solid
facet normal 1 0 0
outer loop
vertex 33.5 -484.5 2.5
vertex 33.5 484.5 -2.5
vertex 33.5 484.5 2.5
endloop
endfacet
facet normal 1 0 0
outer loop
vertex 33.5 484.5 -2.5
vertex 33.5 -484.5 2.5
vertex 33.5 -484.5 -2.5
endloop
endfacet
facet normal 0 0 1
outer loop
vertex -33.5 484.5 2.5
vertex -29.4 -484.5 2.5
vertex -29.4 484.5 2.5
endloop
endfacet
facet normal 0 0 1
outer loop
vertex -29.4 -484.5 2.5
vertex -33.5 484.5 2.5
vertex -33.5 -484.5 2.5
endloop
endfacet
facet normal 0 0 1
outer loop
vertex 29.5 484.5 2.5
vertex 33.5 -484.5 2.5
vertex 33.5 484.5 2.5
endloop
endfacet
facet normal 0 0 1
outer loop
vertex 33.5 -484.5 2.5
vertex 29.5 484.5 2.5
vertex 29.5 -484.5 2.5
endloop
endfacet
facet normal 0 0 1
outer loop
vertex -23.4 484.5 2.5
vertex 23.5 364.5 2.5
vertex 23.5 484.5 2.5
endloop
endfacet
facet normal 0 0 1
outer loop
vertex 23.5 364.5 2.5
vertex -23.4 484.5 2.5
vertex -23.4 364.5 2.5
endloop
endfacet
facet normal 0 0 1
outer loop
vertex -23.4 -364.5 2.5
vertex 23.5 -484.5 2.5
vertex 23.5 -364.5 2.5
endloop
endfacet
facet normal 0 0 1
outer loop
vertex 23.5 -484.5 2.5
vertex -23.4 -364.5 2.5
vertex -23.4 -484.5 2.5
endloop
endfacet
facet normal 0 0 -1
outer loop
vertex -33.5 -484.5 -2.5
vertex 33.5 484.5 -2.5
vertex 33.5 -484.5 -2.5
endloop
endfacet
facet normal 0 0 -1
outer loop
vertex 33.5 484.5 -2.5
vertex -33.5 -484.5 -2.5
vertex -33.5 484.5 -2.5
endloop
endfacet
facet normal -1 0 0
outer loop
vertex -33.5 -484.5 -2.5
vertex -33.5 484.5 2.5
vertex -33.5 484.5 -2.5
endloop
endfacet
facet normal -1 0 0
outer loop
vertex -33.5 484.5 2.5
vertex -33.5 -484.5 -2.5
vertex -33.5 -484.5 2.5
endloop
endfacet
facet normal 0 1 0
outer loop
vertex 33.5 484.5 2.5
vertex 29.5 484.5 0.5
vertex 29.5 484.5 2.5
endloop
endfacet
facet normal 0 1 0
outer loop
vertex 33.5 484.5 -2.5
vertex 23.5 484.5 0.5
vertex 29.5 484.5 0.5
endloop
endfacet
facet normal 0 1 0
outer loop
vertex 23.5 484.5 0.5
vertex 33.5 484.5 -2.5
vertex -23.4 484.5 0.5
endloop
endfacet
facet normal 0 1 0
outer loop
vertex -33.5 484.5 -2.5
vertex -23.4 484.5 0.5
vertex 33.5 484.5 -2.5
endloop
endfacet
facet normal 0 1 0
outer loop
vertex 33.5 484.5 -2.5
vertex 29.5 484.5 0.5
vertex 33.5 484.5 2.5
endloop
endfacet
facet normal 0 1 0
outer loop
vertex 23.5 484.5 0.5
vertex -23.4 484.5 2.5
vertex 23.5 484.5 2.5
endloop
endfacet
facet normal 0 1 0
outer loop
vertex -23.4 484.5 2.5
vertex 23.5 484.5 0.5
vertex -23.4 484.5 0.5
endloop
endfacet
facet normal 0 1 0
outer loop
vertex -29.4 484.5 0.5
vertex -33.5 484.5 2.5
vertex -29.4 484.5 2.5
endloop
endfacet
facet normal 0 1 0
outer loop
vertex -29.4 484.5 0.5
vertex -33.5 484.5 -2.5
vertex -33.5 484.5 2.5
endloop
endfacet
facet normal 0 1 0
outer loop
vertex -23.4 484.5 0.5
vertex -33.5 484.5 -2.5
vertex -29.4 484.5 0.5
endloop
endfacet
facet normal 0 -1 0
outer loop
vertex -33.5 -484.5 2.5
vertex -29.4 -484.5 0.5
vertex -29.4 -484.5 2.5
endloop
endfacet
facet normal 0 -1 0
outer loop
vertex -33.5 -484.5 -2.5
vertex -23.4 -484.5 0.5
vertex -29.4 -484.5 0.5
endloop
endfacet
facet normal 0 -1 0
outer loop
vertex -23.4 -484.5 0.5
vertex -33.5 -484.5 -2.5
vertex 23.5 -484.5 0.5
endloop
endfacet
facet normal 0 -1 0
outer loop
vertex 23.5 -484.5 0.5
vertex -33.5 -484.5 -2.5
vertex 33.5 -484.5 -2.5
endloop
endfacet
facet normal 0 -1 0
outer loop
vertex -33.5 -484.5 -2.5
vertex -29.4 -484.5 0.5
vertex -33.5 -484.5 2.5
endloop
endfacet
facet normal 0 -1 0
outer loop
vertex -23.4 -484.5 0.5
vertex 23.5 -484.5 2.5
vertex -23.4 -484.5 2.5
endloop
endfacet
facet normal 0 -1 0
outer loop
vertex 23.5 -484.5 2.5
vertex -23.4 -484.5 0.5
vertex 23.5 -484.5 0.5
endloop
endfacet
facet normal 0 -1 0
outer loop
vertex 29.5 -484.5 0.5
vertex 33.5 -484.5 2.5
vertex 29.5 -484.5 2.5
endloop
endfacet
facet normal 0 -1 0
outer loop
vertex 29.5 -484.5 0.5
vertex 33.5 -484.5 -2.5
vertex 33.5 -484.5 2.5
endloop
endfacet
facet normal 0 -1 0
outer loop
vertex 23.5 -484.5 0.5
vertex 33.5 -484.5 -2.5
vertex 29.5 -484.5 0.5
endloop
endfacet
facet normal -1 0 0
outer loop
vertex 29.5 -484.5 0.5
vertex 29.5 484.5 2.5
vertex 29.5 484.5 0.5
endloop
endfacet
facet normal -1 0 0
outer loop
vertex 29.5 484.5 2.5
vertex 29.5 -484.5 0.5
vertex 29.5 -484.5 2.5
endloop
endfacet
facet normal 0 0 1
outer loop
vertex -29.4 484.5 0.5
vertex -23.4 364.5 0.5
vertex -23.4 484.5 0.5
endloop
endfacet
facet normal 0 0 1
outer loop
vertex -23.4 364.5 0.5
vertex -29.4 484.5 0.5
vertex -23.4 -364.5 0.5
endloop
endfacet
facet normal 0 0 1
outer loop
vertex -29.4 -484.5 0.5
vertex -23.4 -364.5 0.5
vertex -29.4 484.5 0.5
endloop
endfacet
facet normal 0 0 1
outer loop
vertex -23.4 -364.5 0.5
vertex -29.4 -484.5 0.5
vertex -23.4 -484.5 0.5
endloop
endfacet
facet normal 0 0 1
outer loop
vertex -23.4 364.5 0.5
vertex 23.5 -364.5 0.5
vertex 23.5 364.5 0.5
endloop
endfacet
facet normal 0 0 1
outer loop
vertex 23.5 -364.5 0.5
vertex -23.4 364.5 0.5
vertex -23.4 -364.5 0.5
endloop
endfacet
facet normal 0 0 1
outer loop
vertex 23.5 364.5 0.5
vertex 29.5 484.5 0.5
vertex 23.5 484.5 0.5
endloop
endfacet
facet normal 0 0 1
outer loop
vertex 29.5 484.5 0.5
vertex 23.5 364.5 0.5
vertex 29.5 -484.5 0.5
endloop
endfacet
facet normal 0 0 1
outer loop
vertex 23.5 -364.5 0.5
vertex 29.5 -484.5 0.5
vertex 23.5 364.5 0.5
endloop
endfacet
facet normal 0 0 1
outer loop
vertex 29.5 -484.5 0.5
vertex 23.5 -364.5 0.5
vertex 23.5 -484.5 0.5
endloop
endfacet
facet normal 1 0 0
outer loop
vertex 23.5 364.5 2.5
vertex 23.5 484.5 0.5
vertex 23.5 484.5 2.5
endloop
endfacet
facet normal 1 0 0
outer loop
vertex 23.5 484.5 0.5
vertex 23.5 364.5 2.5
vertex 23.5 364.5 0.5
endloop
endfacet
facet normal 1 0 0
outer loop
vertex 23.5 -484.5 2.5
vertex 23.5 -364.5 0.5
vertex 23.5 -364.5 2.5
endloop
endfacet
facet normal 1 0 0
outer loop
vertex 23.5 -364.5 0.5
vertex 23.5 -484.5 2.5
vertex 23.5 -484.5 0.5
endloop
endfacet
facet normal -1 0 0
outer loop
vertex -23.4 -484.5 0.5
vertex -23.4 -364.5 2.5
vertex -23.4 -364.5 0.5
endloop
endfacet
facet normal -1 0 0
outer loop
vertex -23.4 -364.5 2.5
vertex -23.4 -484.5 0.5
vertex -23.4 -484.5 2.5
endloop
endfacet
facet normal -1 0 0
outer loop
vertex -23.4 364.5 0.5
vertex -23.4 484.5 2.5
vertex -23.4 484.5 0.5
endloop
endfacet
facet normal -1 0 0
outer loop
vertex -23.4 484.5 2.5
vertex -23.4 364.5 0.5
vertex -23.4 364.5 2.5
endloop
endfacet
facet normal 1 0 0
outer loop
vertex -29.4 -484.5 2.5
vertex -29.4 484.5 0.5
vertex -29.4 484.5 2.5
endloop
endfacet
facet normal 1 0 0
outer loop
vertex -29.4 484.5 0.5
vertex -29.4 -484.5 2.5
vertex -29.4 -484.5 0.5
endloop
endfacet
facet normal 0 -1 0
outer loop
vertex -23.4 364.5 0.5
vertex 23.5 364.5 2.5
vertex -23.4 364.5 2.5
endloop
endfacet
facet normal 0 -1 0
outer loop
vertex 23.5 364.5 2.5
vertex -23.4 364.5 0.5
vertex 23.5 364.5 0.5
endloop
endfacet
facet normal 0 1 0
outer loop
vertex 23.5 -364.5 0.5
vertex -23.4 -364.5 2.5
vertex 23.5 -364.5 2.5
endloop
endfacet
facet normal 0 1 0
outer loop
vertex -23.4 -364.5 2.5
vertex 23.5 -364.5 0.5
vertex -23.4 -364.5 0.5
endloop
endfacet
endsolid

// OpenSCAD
// file: lib/TextGenerator.scad
//Draw text
scale([4,4,4]) drawtext("Hello World!");

//Draw character set
//scale([2,2,2]) drawtext(" !\"#$%&'()*+,-./0123456789:;<=>?@ABCDEFGHIJKLMNOPQRSTUVWXYZ[\\]^_`abcdefghijklmnopqrstuvwxyz{|}");

module drawtext(text) {
	//Characters
	chars = " !\"#$%&'()*+,-./0123456789:;<=>?@ABCDEFGHIJKLMNOPQRSTUVWXYZ[\\]^_`abcdefghijklmnopqrstuvwxyz{|}";

	//Chracter table defining 5x7 characters
	//Adapted from: http://www.geocities.com/dinceraydin/djlcdsim/chartable.js
	char_table = [ [ 0, 0, 0, 0, 0, 0, 0],
                  [ 4, 0, 4, 4, 4, 4, 4],
                  [ 0, 0, 0, 0,10,10,10],
                  [10,10,31,10,31,10,10],
                  [ 4,30, 5,14,20,15, 4],
                  [ 3,19, 8, 4, 2,25,24],
                  [13,18,21, 8,20,18,12],
                  [ 0, 0, 0, 0, 8, 4,12],
                  [ 2, 4, 8, 8, 8, 4, 2],
                  [ 8, 4, 2, 2, 2, 4, 8],
                  [ 0, 4,21,14,21, 4, 0],
                  [ 0, 4, 4,31, 4, 4, 0],
                  [ 8, 4,12, 0, 0, 0, 0],
                  [ 0, 0, 0,31, 0, 0, 0],
                  [12,12, 0, 0, 0, 0, 0],
                  [ 0,16, 8, 4, 2, 1, 0],
                  [14,17,25,21,19,17,14],
                  [14, 4, 4, 4, 4,12, 4],
                  [31, 8, 4, 2, 1,17,14],
                  [14,17, 1, 2, 4, 2,31],
                  [ 2, 2,31,18,10, 6, 2],
                  [14,17, 1, 1,30,16,31],
                  [14,17,17,30,16, 8, 6],
                  [ 8, 8, 8, 4, 2, 1,31],
                  [14,17,17,14,17,17,14],
                  [12, 2, 1,15,17,17,14],
                  [ 0,12,12, 0,12,12, 0],
                  [ 8, 4,12, 0,12,12, 0],
                  [ 2, 4, 8,16, 8, 4, 2],
                  [ 0, 0,31, 0,31, 0, 0],
                  [16, 8, 4, 2, 4, 8,16],
                  [ 4, 0, 4, 2, 1,17,14],
                  [14,21,21,13, 1,17,14],
                  [17,17,31,17,17,17,14],
                  [30,17,17,30,17,17,30],
                  [14,17,16,16,16,17,14],
                  [30,17,17,17,17,17,30],
                  [31,16,16,30,16,16,31],
                  [16,16,16,30,16,16,31],
                  [15,17,17,23,16,17,14],
                  [17,17,17,31,17,17,17],
                  [14, 4, 4, 4, 4, 4,14],
                  [12,18, 2, 2, 2, 2, 7],
                  [17,18,20,24,20,18,17],
                  [31,16,16,16,16,16,16],
                  [17,17,17,21,21,27,17],
                  [17,17,19,21,25,17,17],
                  [14,17,17,17,17,17,14],
                  [16,16,16,30,17,17,30],
                  [13,18,21,17,17,17,14],
                  [17,18,20,30,17,17,30],
                  [30, 1, 1,14,16,16,15],
                  [ 4, 4, 4, 4, 4, 4,31],
                  [14,17,17,17,17,17,17],
                  [ 4,10,17,17,17,17,17],
                  [10,21,21,21,17,17,17],
                  [17,17,10, 4,10,17,17],
                  [ 4, 4, 4,10,17,17,17],
                  [31,16, 8, 4, 2, 1,31],
                  [14, 8, 8, 8, 8, 8,14],
                  [ 0, 1, 2, 4, 8,16, 0],
                  [14, 2, 2, 2, 2, 2,14],
                  [ 0, 0, 0, 0,17,10, 4],
                  [31, 0, 0, 0, 0, 0, 0],
                  [ 0, 0, 0, 0, 2, 4, 8],
                  [15,17,15, 1,14, 0, 0],
                  [30,17,17,25,22,16,16],
                  [14,17,16,16,14, 0, 0],
                  [15,17,17,19,13, 1, 1],
                  [14,16,31,17,14, 0, 0],
                  [ 8, 8, 8,28, 8, 9, 6],
                  [14, 1,15,17,15, 0, 0],
                  [17,17,17,25,22,16,16],
                  [14, 4, 4, 4,12, 0, 4],
                  [12,18, 2, 2, 2, 6, 2],
                  [18,20,24,20,18,16,16],
                  [14, 4, 4, 4, 4, 4,12],
                  [17,17,21,21,26, 0, 0],
                  [17,17,17,25,22, 0, 0],
                  [14,17,17,17,14, 0, 0],
                  [16,16,30,17,30, 0, 0],
                  [ 1, 1,15,19,13, 0, 0],
                  [16,16,16,25,22, 0, 0],
                  [30, 1,14,16,15, 0, 0],
                  [ 6, 9, 8, 8,28, 8, 8],
                  [13,19,17,17,17, 0, 0],
                  [ 4,10,17,17,17, 0, 0],
                  [10,21,21,17,17, 0, 0],
                  [17,10, 4,10,17, 0, 0],
                  [14, 1,15,17,17, 0, 0],
                  [31, 8, 4, 2,31, 0, 0],
                  [ 2, 4, 4, 8, 4, 4, 2],
                  [ 4, 4, 4, 4, 4, 4, 4],
                  [ 8, 4, 4, 2, 4, 4, 8] ];

	//Binary decode table
	dec_table = [ "00000", "00001", "00010", "00011", "00100", "00101",
  	            "00110", "00111", "01000", "01001", "01010", "01011",
  	            "01100", "01101", "01110", "01111", "10000", "10001",
  	            "10010", "10011", "10100", "10101", "10110", "10111",
	            "11000", "11001", "11010", "11011", "11100", "11101",
	            "11110", "11111" ];

	//Process string one character at a time
	for(itext = [0:len(text)-1]) {
		//Convert character to index
		ichar = search(text[itext],chars,1)[0];

        //Decode character - rows
        for(irow = [0:6]) {
            //Select value to draw from table
            val = dec_table[char_table[ichar][irow]];

            //Decode character - cols
            for(icol = [0:4]) {
                // Retrieve bit to draw
                bit = search(val[icol],"01",1)[0];

                if(bit) {
                    //Output cube
                    translate([icol + (6*itext), irow, 0])
                        cube([1.0001,1.0001,1]);
                }
            }
        }
	}
}
// file: ../Parameters.scad
//Main tube diameter - hole [mm]
main_tube_outer_diameter = 25.4;
main_tube_inner_diameter = 23.5;

//Tube for undercarriage - hole [mm]
tube_for_undercarriage_outer_diameter = 10.6;
tube_for_undercarriage_inner_diameter = 6;
global_clearance = 0.5;


//umístění podvozkových trubek

second_undercarriage_hole = main_tube_outer_diameter*2 + main_tube_outer_diameter/5 + main_tube_outer_diameter/2 + 170 + 160;

// Parameters of tube couplings
coupling_wall_thickness = main_tube_outer_diameter/5;  //width of coupling walls 
thickness_between_tubes = main_tube_outer_diameter/10;    // minimum distance between tubes in couplings

coupling_wall_thickness_undercarriage = tube_for_undercarriage_outer_diameter/3;
thickness_between_tubes_undercarriage = tube_for_undercarriage_outer_diameter/10;

//Screw diameter and nut for M4 [mm]
M4_screw_diameter=4.5;
Nut_height_M4 = 3.2;
Nut_diameter_M4 = 8.4;


//Screw diameter and nut for M3 [mm]
M3_screw_diameter = 3.2;
Nut_height_M3 = 2.7;	
Nut_diameter_M3 = 6.6; 


//The tube for help
Help_main_tube_outer = 25;
Help_main_tube_inner = 23; 
Help_tube_for_undercarriage_outer = 10;
Help_tube_for_undercarriage_inner = 5;


//main hull parameters

hull_drop_length = 580;
hull_wall_thickness = 0.8;
hull_y_size = 120;
hull_z_size = 150;
hull_x_size = 580;
hull_corner_radius = 4;
hull_airfoil_thickness= 35;  // thickness of drop generating airfoil in percent of lenght.
hull_scale_x = 1;
hull_scale_y = 1.5;
hull_scale_z = 1.5;

main_pilon_position = 170+68;
cover_pilon_position = 180;
height_of_vertical_tube = 275; //278mm je změřená délka trubky. 

//délka hlavní dlouhé trubky
length_of_main_tube = 920;
length_of_undercarriage_tube = 300;

ribbon_width = 5; // šířka vyztužovacích lemů. 

// šířka otvoru v přední části kapoty pro držák motoru.
width_of_engine_holder = 63;

//Top Cover Division - dělení horního krytu pro tisk
top_cover_division = [0, 50, 150, 280, 410, hull_x_size]; // upraveny seznam tak, aby deleni začinalo od nuly, což umožňí úplně automatické rozdělení.

//Bottom Cover Division - dělení dolního krytu pro tisk
bottom_cover_division = [0,100,232.5,365, 470, hull_x_size];
// zkrácená část pro payload pro testovací tisk
//bottom_cover_division = [0,200,250,365, 470, hull_x_size];

//Base Divison - dělení podložky
base_division = [0, 140, main_pilon_position - (3*main_tube_outer_diameter)/2 + 3 * main_tube_outer_diameter,second_undercarriage_hole - main_tube_outer_diameter/2 - coupling_wall_thickness + main_tube_outer_diameter+2*(main_tube_outer_diameter/5) + global_clearance, hull_x_size];

//Cover pilon division - na výšku (v ose Z)
cover_pilon_division = [0,170,height_of_vertical_tube + main_tube_outer_diameter + coupling_wall_thickness];

//pozice šroubů
	//horní kryt
top_screw_position = [0,(top_cover_division[0] + top_cover_division[1])/2,(top_cover_division[2] - top_cover_division[1])/2 + top_cover_division[1],(top_cover_division[3] - top_cover_division[2])/2 + top_cover_division[2],(top_cover_division[4] - top_cover_division[3])/8 + top_cover_division[3],(top_cover_division[5] - top_cover_division[4])/2 + top_cover_division[4] - 15];
	//spodní kryt
bottom_screw_position = [0,
                        (bottom_cover_division[0] + bottom_cover_division[1])*(2/6), 
                        bottom_cover_division[1]*(9/10), 
                        bottom_cover_division[3] + bottom_cover_division[1]*(1/10), 
                        bottom_cover_division[3] + bottom_cover_division[1]*(3/5)];




//šířka zámků
lock_width = 10;

//délka zámků
lock_length = 3;


//accumulator
//základní rozměry akumulátoru
width_of_accumulator = 129.4;//45+1;
depth_of_accumulator = 40.61;
height_of_accumulator = 43.65;
//Zapuštění akumulátoru
sink_of_accumulator = 5; //main_tube_outer_diameter/5 - Nut_height_M3*1.5;

//tloušťka hrany spojky
accumulator_holder_width = 18; 
accumulator_holder_thickness = 10; 

//posunutí akumálátoru na podložce
move_of_accumulator = 165;   // pozice akumulátoru (ovlivňuje těžiště)


////////////////
// Senzory
///////////////////

//opticalFlow
    width_optical_flow_senzor = 45.5;
    depth_optical_flow_senzor = 6;
    height_optical_flow_senzor = 35;
    sink_of_optical_flow_senzor = depth_optical_flow_senzor - 5; 
    M3_optical_flow_senzor_Z = 30.4;
    M3_optical_flow_senzor_X = 24;
    M3_optical_flow_senzor_Z_alone = 9.1;
    M3_optical_flow_senzor_X_alone = 16.7;

//GPS anténa
GPS_outer_length = 48.01;   //Vnější rozměr
GPS_inner_length = 37.48;   //Vnitřní rozměr
GPS_diameter = (GPS_outer_length - GPS_inner_length)/2;    //Průměr otvoru
GPS_middle_length = GPS_diameter + GPS_inner_length;      //Střední rozměr


////podzvozek

radius_undercarriage = 25;

vzdalenost_x = tan(20) * 131;
echo ("vzdalenost_x is:", vzdalenost_x);

vzdalenost_y = (131 - radius_undercarriage)/tan(79);
echo ("vzdalenost_y is:", vzdalenost_y);

maximum_printable_size = 150;
// file: lib/bevel.scad
/*
This is an OpenSCAD module that creates an inner bevel between any (convex) part and a plane at z=h. 
Please note that the part does not have to be perpendicular to the z-plane. The bevel will be h_bevel high and r_bevel wide. 
For h_bevel equal to r_bevel the bevel will have circular cross section in the plane(s) perpendicular to the z-plane.
The number of faces of the bevel along its cross section is given by fn_bevel. 
For fn_bevel=1 this will be a linear bevel. The 'roundness' of the bevel along the z-plane is given by $fn.
This module uses projection() to get the 2d shape of the part at a certain height. This shape is then minkowski()-ed with a circle with the radius of the width of the bevel at this height. In a last step hull() is applied to two layers of consecutive height.
Because of the use of the hull() command the shape of the part has to be convex (concave parts would be filled in from the hull() command).
Because of a limitation of the minkowski() command the part has to be simple: no holes and not comprised out of two disjoint shapes. 
*/


h=20;

h_bevel=6;
r_bevel=3;

function h_bev(i)=h_bevel*(1-cos(90*i));
function r_bev(i)=((i==1)?e:0)+r_bevel*(1-sin(90*i));


e=0.001;

fn_bevel=16 ;
$fn=32;

module part_base(){
	cube([60,30,20]);
}

module part1(){
	translate([25,15,20])
		rotate([0,0,0])
			cylinder(40,10,5,true,$fn=3);
}

module part2(){
	translate([25,15,20])
		difference(){
		rotate([90,0,0])
			rotate_extrude()translate([10,0,0])circle(5);
		rotate([0,45,0])translate([100,0,0])cube(200,true);
		}
}

module part3(){
	translate([25,15,20])
		rotate([0,135,0])
			translate([-10,0,0])
			linear_extrude(height=15+e,scale=[1,e])circle(5);
}


module part4(){
	translate([25,15,0])
			translate([-10,0,0])
			cube([10,10,100]);
			/*union(){
				airfoil(naca = 0015, L = 20, N = 100, h = 50, open = false);
			}*/
}

module slice(h){
	projection(cut=true)
		translate([0,0,-h])
			children(0);
}

module edge(){
	difference(){
		minkowski(){
			children(0);
			circle(e);
		}
		children(0);
	}
}

module bev(i){
	minkowski(){
		children(0);
		circle(r_bev(i));
	}
}

module extrude(){
	linear_extrude(height=e)children(0);
}

module bevel(h,h_bevel,r_bevel,fn_bevel){
	translate([0,0,h])
		for(i=[0:1/fn_bevel:1-1/fn_bevel]){
			hull(){
				translate([0,0,h_bev(i)])
					extrude()bev(i)edge()slice(h+h_bev(i))children(0);
				translate([0,0,h_bev(i+1/fn_bevel)])
					extrude()bev(i+1/fn_bevel)edge()slice(h+h_bev(i+1/fn_bevel))children(0);
			}
		}
}


use <./naca4.scad>

//bevel(10,10,10,20)airfoil(naca = 0015, L = 100, N = 100, h = 50, open = false);

bevel(0,5,10,20)cube(20, center=true);


//bevel(h,h_bevel,r_bevel,fn_bevel)part2();
//bevel(h,h_bevel,r_bevel,fn_bevel)part3();
part1();
//part1();
bevel(h,h_bevel,r_bevel,fn_bevel)part1();
//part4();
//part1();
//part_base();
// file: lib/naca4.scad
// Naca4.scad - library for parametric airfoils of 4 digit NACA series
// Code: Rudolf Huttary, Berlin 
// June 2015
// commercial use prohibited


// general use: for more examples refer to sampler.scad
// naca = naca digits or 3el vector  (default = 12 or [0, 0, .12])
// L    = chord length [mm]      (default= 100)
// N    = # sample points        (default= 81)
// h    = height [mm]            (default= 1)
// open = close at the thin end? (default = true)
// two equivalent example calls
 airfoil(naca = 2408, L = 60, N=1001, h = 30, open = false); 
// airfoil(naca = [.2, .4, .32], L = 60, N=1001, h = 30, open = false); 

module help()
{
  echo(str("\n\nList of signatures in lib:\n=================\n", 
  "module airfoil(naca=2412, L = 100, N = 81, h = 1, open = false) - renders airfoil object\n", 
  "module airfoil(naca=[.2, .4, .12], L = 100, N = 81, h = 1, open = false) - renders airfoil object using percentage for camber,  camber distance and thicknes\n", 
  "function airfoil_data(naca=12, L = 100, N = 81, open = false)\n",
  "=================\n")); 
}

help(); 
// this is the object
module airfoil(naca=12, L = 100, N = 81, h = 1, open = false)
{
  linear_extrude(height = h)
  polygon(points = airfoil_data(naca, L, N, open)); 
}

module hollow_airfoil(lnaca=12, L = 100, N = 81, h = 1, open = false, wall_thickness = 1)
{
    if (open){
        linear_extrude(height = h)
            difference(){
                polygon(points = airfoil_data(naca, L, N, false));
                offset(delta = - wall_thickness, chamfer = false) polygon(points = airfoil_data(naca, L, N, open = false));
            }
    }
    else{

        linear_extrude(height = wall_thickness)
            polygon(points = airfoil_data(naca, L, N, false)); 

        linear_extrude(height = h)
            difference(){
                polygon(points = airfoil_data(naca, L, N, open));
                offset(delta = - wall_thickness) polygon(points = airfoil_data(naca, L, N, open = false));
            }

        translate([0,0, h - wall_thickness])
            linear_extrude(height = wall_thickness)
                polygon(points = airfoil_data(naca, L, N, false)); 

    }
}


// this is the main function providing the airfoil data
function airfoil_data(naca=12, L = 100, N = 81, open = false) = 
  let(Na = len(naca)!=3?NACA(naca):naca)
  let(A = [.2969, -0.126, -.3516, .2843, open?-0.1015:-0.1036])
  [for (b=[-180:360/(N):179.99]) 
    let (x = (1-cos(b))/2)  
    let(yt = sign(b)*Na[2]/.2*(A*[sqrt(x), x, x*x, x*x*x, x*x*x*x])) 
    Na[0]==0?L*[x, yt]:L*camber(x, yt, Na[0], Na[1], sign(b))];  


function trailing_edge_angle(naca=12, open = false) = 
  let(Na = len(naca)!=3?NACA(naca):naca)
  let(A = [.2969, -0.126, -.3516, .2843, open?-0.1015:-0.1036])
  let (x =0.999)  // set x near to airfoil trailing edge
  let(yt = Na[2]/.2*(A*[sqrt(x), x, x*x, x*x*x, x*x*x*x])) // calculate distance from x-axis at previously set position
  atan2(yt,1-x);  // calculate angle of triangle between end of airfoil. The triange height corresponds to previously calculated distance from x-axis

function surface_angle(x = 0.5, naca=12, open = false) = 
  let(Na = len(naca)!=3?NACA(naca):naca)
  let(A = [0.2969, -0.126, -0.3516, 0.2843, open?-0.1015:-0.1036])
  let(dy = Na[2]/0.2*(A*[(1/2)*(1/sqrt(x)), 1, 2*x, 3*x*x, 4*x*x*x])) // calculate derivative of airfoil function at the x point
  atan(dy);  // calculate  the angle from function derivative

function surface_distance(x = 0.5, naca=12, open = false) = 
  let(Na = len(naca)!=3?NACA(naca):naca)
  let(A = [0.2969, -0.126, -0.3516, 0.2843, open?-0.1015:-0.1036])
  Na[2]/.2*(A*[sqrt(x), x, x*x, x*x*x, x*x*x*x]); // calculate distance from x-axis at previously set position

// helper functions
function NACA(naca) = 
  let (M = floor(naca/1000))
  let (P = floor((naca-M*1000)/100)) 
  [M/100, P/10, floor(naca-M*1000-P*100)/100];  

function camber(x, y, M, P, upper) = 
  let(yc = (x<P)?M/P/P*(2*P*x-x*x): M/(1-P)/(1-P)*(1 - 2*P + 2*P*x -x*x))
  let(dy = (x<P)?2*M/P/P*(P-x):2*M/(1-P)/(1-P)*(P-x))
  let(th = atan(dy))
  [upper ? x - y*sin(th):x + y*sin(th), upper ? yc + y*cos(th):yc - y*cos(th)];
// main file
DOC_SCALING_FACTOR = 100;
DOC_HEIGHT = 250;

include <./lib/dimlines.scad>

DIM_LINE_WIDTH = .025 * DOC_SCALING_FACTOR;
DIM_SPACE = .1 * DOC_SCALING_FACTOR;

draft = false;   // sets rendering quality to draft.
$fs = draft ? 5 : 0.5;
$fa = 10;

// Nastavení zobrazení
/*$vpr = [38, 0, 38];
$vpt = [0, 0, 0];
$vpd = 1960;
*/


module 333_1037(twosided = true, draft = false){

    airfoil_NACA = 0016;    // typ použitého profilu
    airfoil_depth = 50; // hloubka profilu
    length = 970-1;       // celková délka polotovaru
    material_width = 70;
    core_thickness = 1.0;       // tloušťka jádra
    airfoil_thickness = (airfoil_NACA/100) * airfoil_depth; // vypočtená maximální tloušťka profilu
    bridge_thickness = 0.6;  // tloušťka spojení mezi rotorovým listem a rámečkem
    milling_cutter_radius = 1.5;

    if(twosided) // výpis vypočtené tloušťky profilu
        echo("Minimum material thickness", airfoil_thickness);
    else
        echo("Minimum material thickness", airfoil_thickness/2 - core_thickness/2);  

    //difference (){      // odečet poloviny polotovaru a jádra v případě, že jde o jednostranný  polotovar

    difference (){
        cube([material_width - 2*milling_cutter_radius, length, airfoil_thickness - 2*milling_cutter_radius], center = true); // základní materiál

        // odečet frézovaného objemu, pokud jde o jednostranný polotovar, tak musí být zanechán materiál pro přidržení rámečku materiálu.
    	translate([airfoil_depth/2 + milling_cutter_radius, 0, airfoil_thickness/2 - milling_cutter_radius - core_thickness/2])
            cube([4* milling_cutter_radius, 2*length, 2* milling_cutter_radius], center = true);

        translate([-airfoil_depth/2 + 0.1 - milling_cutter_radius, 0, airfoil_thickness/2 - milling_cutter_radius - core_thickness/2])
            cube([4* milling_cutter_radius, 2*length, 2* milling_cutter_radius], center = true);

        // boční drážky mezi rámečkem a listem
        translate([airfoil_depth/2 + milling_cutter_radius, 0, milling_cutter_radius + core_thickness/2])
            rotate([90,0,0])
                cylinder(r = milling_cutter_radius, h = 2*length, $fn = draft ? 20 :50, center = true);

        translate([-airfoil_depth/2 + 0.1 - milling_cutter_radius, 0, milling_cutter_radius + core_thickness/2])
            rotate([90,0,0])
                cylinder(r = milling_cutter_radius, h = 2*length, $fn = draft ? 20 :50, center = true);
                
        // místo pro list
        translate ([0, 0, airfoil_thickness/2 + core_thickness/2])
            cube([airfoil_depth + 2* milling_cutter_radius, length - 2*120, airfoil_thickness], center = true);


    }

    // profil rotorového listu
    /*//color("Blue",0.5)
    translate ([ -airfoil_depth/2 + 0.1, length/2, 0])
        rotate([90, 0, 0])
            airfoil(naca = airfoil_NACA, L = airfoil_depth, N = draft ? 50 : 100, h = length, open = false);  

    // přechod z kořenu rotorového listu na list
    intersection(){
        translate ([ 0.1, 0, 0])
            minkowski()     // základní materiál
            {
                cube([airfoil_depth - 2* milling_cutter_radius, length,airfoil_thickness - 2* milling_cutter_radius], center = true);
                rotate([90,0,0])
                    cylinder(r = milling_cutter_radius, h = 2*length, $fn = draft ? 20 :50, center = true);
            }

        union(){
            translate ([ -material_width/2 + 2.6 + 7.5, length/2, 0])
                rotate([90, 0, 0])
                    bevel(120,15,15, draft ? 5 : 50)
                        airfoil(naca = airfoil_NACA, L = airfoil_depth, N = draft ? 50 : 100, h = length, open = false);

            translate ([ -material_width/2 + 2.6 + 7.5, -length/2, 0])
                rotate([-90,0,0])
                    bevel(120,15,15,draft ? 5 : 50)
                        airfoil(naca = airfoil_NACA, L = airfoil_depth, N = draft ? 50 : 100, h = length, open = false);
        }
    }*/

}

module 333_1037_doc(length = 970, material_width = 70, twosided = true, draft = false){

    translate([0, 0, DOC_HEIGHT])
    color("Black")
        union(){
            translate([-material_width / 2, length/ 2, 0])
                rotate([0, 0, 90])
                line(DIM_SPACE * 3, line_width=DIM_LINE_WIDTH);

            translate([material_width / 2, length/ 2, 0])
                rotate([0, 0, 90])
                line(DIM_SPACE * 3, line_width=DIM_LINE_WIDTH);

            translate([material_width / 2, length/ 2, 0])
                line(DIM_SPACE * 3, line_width=DIM_LINE_WIDTH);

            translate([material_width / 2, -length/ 2, 0])
                line(DIM_SPACE * 3, line_width=DIM_LINE_WIDTH);


            translate([-material_width / 2, length/2 + DIM_SPACE * 2 , 0])
                dimensions(material_width, line_width=DIM_LINE_WIDTH, loc=DIM_CENTER);

            translate([material_width / 2 + DIM_SPACE * 2, -length/ 2 , 0])
                rotate([0, 0, 90])
                    dimensions(length, line_width=DIM_LINE_WIDTH, loc=DIM_CENTER);
        }

}

333_1037(twosided = true, draft = draft);
//333_1037_doc(length=970);



use <./lib/naca4.scad>
use <./lib/bevel.scad>
use <./lib/dimlines.scad>
include <../Parameters.scad>
